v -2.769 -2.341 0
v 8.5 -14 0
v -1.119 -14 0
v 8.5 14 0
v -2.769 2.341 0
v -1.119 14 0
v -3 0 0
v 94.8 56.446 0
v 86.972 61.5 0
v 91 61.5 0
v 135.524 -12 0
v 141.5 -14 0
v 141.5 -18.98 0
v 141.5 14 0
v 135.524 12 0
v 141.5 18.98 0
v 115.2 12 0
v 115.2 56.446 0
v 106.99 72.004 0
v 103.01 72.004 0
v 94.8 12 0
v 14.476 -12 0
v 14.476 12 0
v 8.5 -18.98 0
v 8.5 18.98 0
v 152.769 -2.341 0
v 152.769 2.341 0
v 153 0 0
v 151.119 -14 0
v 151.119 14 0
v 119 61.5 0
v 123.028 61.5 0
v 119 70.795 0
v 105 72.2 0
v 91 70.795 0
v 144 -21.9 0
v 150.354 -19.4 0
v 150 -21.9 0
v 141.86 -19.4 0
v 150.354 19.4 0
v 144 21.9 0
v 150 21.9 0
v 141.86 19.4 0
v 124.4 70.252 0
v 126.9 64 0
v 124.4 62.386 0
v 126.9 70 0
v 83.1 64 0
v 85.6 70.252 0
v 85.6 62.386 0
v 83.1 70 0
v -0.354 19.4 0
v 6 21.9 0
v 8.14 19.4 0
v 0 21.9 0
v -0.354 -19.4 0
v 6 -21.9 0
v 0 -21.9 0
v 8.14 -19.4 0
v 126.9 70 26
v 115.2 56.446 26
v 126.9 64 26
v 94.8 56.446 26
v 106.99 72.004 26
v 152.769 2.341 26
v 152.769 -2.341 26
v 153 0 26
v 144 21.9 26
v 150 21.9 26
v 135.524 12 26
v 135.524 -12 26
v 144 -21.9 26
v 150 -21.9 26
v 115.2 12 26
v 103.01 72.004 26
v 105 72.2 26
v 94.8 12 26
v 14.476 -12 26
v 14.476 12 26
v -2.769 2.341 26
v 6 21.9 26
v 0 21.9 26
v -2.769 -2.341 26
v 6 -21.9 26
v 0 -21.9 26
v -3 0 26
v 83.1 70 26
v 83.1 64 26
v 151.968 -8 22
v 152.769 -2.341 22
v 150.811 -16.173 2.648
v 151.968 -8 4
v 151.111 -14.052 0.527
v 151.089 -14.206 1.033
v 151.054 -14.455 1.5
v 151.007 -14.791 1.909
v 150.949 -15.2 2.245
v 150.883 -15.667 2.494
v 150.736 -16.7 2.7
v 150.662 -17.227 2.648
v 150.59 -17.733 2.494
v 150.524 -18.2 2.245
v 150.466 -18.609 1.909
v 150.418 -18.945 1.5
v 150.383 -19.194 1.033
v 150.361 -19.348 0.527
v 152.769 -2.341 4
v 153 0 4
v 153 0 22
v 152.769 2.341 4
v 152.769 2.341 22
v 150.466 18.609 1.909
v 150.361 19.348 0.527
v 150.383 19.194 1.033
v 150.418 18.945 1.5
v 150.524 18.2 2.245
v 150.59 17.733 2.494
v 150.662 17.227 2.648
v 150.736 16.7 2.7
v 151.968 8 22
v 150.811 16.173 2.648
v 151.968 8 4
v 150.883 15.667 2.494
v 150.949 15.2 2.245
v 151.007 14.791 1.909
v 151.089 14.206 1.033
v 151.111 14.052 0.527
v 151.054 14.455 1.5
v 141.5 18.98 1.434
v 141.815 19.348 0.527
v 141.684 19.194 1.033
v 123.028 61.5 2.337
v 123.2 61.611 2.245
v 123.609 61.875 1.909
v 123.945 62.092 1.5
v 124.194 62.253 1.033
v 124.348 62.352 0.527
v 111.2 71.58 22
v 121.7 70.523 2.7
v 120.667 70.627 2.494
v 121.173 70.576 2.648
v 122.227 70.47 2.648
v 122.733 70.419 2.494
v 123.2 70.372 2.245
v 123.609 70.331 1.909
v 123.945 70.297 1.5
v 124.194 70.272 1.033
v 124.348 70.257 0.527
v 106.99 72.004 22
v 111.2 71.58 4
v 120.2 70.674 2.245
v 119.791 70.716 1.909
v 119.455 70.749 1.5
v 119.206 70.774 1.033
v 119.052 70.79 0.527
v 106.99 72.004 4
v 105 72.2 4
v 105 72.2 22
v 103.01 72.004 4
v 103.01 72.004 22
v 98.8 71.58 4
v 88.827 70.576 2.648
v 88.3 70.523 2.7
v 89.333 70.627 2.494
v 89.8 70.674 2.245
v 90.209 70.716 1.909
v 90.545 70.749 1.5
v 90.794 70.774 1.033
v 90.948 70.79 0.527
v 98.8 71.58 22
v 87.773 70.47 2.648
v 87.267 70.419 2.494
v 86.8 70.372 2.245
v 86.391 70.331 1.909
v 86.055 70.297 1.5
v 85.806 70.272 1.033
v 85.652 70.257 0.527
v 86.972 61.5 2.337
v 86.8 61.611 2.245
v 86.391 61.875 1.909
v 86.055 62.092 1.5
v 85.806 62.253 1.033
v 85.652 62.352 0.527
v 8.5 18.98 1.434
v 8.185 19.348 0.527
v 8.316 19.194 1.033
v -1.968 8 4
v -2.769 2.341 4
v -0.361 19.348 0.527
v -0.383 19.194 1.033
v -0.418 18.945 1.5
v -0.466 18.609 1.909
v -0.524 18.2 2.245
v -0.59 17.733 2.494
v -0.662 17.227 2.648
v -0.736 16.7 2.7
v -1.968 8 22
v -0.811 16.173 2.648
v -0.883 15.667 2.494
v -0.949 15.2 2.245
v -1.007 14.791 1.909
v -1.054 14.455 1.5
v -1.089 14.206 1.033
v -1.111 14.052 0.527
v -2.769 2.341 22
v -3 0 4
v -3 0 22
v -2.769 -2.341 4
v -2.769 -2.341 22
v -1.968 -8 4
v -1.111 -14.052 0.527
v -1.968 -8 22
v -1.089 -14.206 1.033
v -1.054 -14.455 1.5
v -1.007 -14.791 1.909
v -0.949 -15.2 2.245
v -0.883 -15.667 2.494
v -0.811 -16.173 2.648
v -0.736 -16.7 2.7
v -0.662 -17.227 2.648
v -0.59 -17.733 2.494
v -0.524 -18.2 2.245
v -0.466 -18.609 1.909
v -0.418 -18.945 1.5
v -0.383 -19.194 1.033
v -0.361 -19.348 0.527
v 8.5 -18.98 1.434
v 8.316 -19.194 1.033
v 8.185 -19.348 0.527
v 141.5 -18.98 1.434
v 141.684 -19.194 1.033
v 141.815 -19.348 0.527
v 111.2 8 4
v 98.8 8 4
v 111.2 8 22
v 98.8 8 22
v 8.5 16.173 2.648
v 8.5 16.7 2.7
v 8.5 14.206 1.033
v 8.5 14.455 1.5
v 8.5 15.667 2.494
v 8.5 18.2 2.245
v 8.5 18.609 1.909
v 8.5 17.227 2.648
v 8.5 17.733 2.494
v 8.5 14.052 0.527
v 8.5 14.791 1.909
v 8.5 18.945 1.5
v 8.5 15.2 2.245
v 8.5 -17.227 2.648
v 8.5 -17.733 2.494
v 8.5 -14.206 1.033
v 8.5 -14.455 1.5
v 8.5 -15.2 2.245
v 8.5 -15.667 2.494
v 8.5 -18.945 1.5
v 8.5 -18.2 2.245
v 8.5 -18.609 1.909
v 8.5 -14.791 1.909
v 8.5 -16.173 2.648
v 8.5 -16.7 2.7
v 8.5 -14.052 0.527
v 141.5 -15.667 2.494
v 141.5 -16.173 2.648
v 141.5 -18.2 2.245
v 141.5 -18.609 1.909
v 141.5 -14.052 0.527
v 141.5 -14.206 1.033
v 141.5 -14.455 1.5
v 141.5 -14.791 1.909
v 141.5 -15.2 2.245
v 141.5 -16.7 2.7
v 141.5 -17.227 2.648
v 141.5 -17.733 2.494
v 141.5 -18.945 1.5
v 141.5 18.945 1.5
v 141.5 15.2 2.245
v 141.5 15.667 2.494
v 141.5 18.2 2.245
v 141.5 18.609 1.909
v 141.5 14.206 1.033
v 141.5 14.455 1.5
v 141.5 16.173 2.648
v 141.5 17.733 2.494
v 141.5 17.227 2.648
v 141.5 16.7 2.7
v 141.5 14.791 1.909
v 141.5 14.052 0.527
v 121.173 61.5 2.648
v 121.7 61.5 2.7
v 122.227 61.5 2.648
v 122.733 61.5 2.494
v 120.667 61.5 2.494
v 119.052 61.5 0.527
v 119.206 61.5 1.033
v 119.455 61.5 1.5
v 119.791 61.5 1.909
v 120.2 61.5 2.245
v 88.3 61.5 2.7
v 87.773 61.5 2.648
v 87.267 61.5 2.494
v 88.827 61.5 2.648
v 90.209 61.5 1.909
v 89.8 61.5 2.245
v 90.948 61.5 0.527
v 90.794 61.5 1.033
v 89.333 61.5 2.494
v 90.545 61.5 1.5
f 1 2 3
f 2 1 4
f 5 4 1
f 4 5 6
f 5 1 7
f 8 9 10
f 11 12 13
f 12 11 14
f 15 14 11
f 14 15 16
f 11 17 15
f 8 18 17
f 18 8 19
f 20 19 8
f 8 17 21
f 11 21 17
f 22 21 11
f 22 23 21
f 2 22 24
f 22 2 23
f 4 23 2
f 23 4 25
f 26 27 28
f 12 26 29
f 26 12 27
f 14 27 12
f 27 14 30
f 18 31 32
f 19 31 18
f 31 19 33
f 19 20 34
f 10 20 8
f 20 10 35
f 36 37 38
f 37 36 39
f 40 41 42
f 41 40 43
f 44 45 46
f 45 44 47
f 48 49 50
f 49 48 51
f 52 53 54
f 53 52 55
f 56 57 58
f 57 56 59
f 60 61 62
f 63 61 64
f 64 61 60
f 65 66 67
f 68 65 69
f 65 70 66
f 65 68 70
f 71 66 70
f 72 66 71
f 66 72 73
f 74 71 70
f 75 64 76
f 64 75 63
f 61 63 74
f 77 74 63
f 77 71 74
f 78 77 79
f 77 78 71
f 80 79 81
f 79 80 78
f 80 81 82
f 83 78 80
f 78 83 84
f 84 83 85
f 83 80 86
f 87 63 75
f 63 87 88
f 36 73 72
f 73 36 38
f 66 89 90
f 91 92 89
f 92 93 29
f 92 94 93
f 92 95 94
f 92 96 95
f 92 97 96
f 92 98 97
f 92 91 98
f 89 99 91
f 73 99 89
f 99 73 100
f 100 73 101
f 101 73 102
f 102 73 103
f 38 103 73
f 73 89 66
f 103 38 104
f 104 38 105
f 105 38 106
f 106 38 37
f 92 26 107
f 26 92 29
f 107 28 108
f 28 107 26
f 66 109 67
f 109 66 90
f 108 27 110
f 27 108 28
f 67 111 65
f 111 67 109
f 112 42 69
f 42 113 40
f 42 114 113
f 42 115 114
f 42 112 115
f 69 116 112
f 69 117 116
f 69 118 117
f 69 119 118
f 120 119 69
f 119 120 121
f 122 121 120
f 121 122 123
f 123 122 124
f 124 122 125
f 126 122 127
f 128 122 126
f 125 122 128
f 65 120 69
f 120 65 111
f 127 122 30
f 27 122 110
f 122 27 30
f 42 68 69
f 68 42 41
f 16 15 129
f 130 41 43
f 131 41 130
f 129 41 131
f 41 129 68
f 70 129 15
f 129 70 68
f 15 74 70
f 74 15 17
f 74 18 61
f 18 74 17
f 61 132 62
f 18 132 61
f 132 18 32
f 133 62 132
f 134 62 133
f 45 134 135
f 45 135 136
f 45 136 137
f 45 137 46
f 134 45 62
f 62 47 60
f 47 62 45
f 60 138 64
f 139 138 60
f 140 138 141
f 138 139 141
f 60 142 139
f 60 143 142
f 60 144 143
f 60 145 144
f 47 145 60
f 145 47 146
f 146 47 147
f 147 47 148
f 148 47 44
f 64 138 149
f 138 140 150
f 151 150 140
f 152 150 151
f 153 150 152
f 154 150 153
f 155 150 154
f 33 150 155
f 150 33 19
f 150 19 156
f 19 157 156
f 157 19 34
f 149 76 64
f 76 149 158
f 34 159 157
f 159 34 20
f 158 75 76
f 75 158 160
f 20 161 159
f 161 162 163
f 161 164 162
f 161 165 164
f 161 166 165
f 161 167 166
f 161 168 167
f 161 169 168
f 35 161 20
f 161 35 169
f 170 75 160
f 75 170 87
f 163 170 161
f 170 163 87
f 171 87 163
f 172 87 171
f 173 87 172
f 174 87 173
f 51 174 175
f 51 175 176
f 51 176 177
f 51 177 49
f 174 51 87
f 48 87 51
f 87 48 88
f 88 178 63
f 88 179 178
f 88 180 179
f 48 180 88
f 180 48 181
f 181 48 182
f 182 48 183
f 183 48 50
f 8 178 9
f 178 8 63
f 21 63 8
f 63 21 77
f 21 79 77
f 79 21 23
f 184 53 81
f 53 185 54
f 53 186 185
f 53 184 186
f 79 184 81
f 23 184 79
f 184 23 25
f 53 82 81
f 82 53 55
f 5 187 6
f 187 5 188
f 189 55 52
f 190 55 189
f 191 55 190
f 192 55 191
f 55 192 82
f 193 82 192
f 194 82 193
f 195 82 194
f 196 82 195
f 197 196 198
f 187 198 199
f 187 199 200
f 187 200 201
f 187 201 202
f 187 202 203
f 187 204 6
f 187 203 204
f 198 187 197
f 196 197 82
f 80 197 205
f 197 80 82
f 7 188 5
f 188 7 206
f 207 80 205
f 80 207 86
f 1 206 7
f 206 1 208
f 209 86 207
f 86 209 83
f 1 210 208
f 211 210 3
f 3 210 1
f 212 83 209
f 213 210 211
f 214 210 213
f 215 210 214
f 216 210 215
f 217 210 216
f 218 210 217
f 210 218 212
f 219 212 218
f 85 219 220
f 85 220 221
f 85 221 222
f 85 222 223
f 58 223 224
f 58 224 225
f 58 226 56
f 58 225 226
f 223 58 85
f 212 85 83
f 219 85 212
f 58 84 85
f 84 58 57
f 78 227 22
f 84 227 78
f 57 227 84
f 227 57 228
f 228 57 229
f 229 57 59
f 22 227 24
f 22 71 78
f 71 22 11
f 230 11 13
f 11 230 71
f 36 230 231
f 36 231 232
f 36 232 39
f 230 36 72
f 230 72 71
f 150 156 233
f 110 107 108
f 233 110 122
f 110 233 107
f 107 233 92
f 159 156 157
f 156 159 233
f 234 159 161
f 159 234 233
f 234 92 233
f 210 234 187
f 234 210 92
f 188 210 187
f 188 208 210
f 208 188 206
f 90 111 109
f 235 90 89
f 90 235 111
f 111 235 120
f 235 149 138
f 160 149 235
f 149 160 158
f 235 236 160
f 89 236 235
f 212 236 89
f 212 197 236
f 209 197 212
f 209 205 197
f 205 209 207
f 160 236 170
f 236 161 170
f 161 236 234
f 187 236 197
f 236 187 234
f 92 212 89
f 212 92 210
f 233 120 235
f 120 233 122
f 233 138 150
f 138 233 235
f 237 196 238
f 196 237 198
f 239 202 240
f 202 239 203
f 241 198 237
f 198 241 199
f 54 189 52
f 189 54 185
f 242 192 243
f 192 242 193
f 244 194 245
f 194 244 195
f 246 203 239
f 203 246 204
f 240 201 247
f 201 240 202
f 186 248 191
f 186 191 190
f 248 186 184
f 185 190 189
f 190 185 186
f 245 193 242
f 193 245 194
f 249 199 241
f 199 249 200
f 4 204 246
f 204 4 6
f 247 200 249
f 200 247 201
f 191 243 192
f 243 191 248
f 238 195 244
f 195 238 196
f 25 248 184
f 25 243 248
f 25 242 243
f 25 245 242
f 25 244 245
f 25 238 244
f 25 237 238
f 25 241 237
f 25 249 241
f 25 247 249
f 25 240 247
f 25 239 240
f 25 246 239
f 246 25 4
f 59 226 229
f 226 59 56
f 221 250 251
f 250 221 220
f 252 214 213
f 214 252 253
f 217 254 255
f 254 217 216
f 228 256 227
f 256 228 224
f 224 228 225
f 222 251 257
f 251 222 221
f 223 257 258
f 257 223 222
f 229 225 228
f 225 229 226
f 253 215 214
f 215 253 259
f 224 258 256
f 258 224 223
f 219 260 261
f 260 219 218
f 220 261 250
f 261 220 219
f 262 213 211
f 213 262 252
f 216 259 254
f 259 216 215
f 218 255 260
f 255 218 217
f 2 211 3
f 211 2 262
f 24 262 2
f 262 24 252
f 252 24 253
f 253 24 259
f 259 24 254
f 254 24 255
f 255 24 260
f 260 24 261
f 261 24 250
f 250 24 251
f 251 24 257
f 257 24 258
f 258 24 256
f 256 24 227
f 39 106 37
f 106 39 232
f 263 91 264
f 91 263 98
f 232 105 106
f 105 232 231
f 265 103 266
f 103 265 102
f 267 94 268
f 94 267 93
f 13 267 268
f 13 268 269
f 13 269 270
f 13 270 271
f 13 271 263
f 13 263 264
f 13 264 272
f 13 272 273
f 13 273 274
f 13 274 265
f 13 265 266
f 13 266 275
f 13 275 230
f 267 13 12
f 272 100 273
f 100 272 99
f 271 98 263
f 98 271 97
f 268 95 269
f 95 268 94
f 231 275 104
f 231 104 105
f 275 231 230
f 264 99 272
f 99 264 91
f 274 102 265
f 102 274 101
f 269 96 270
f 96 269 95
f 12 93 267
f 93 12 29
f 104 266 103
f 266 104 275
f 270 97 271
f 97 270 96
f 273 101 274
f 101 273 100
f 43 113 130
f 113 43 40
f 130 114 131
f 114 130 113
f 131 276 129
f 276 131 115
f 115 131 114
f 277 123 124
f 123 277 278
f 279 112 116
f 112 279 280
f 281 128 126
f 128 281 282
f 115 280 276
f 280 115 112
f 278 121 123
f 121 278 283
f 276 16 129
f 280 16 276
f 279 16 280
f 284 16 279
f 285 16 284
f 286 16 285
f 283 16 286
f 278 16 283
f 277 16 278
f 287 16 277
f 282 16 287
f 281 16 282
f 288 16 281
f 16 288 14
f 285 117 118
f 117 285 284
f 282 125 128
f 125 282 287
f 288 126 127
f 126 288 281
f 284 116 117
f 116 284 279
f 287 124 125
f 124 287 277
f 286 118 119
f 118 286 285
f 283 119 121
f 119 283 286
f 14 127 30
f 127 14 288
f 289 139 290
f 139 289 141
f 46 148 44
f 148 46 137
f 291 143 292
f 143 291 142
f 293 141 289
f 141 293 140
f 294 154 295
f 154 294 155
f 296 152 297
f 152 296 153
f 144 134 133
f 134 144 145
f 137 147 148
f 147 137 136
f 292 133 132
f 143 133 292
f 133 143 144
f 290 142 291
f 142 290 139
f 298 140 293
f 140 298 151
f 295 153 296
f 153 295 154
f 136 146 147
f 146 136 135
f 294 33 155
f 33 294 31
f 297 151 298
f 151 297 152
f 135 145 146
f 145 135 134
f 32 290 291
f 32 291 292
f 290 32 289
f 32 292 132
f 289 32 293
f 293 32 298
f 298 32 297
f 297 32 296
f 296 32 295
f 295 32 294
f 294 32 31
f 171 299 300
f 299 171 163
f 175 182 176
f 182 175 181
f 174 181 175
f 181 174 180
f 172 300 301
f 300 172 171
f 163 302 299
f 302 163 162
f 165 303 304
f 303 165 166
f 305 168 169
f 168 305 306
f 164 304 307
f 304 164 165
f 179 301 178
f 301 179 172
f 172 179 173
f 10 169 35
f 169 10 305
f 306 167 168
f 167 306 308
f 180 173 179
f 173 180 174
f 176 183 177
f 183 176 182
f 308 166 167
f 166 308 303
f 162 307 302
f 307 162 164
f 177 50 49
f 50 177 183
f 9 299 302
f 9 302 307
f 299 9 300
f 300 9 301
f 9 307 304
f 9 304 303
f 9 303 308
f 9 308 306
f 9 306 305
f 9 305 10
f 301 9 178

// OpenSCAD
$fn = 32;

// ----------------------------------------------------------------------
// Air duct: 24 mm duct, 4 mm wall, 26 mm across
// ----------------------------------------------------------------------

// --- parameters (mm) ---
duct_r = 12;              // duct core radius
duct_d = 24;              // duct core diameter
wall = 4;                 // duct wall thickness
height = 26;              // duct width (extrusion height)
port_r = 21.9;            // port flange half width
port_d = 43.8;            // port flange width
port_t = 6;               // port flange thickness
bolt_d = 5.4;             // port bolt holes
bolt_offset = 16.7;       // bolt hole offset from the port axis
branch_r = 10.2;          // branch core radius
branch_d = 20.4;          // branch core diameter
branch_len = 70;          // branch length from the run axis

difference() {
  /* outer hull chain: tube with a flat flange plate at every port */
  linear_extrude(height = 26) {
    hull() {
      polygon([[0, -21.9], [0, 21.9], [6, 21.9], [6, -21.9]]);
      translate([9, 0]) circle(r = 12);
    }
    hull() {
      translate([9, 0]) circle(r = 12);
      translate([45, 0]) circle(r = 12);
    }
    hull() {
      translate([45, 0]) circle(r = 12);
      translate([105, 0]) circle(r = 12);
    }
    hull() {
      translate([105, 0]) circle(r = 12);
      translate([141, 0]) circle(r = 12);
    }
    hull() {
      translate([141, 0]) circle(r = 12);
      polygon([[150, 21.9], [150, -21.9], [144, -21.9], [144, 21.9]]);
    }
    hull() {
      translate([105, 0]) circle(r = 10.2);
      translate([105, 38.5]) circle(r = 10.2);
    }
    hull() {
      translate([105, 38.5]) circle(r = 10.2);
      translate([105, 62]) circle(r = 10.2);
    }
    hull() {
      translate([105, 62]) circle(r = 10.2);
      polygon([[83.1, 70], [126.9, 70], [126.9, 64], [83.1, 64]]);
    }
  }
  /* air passage: the same chain inset by the wall, 5 mm proud of the ports */
  translate([0, 0, 4]) linear_extrude(height = 18) {
    hull() {
      translate([-5, 0]) circle(r = 8);
      translate([45, 0]) circle(r = 8);
    }
    hull() {
      translate([45, 0]) circle(r = 8);
      translate([105, 0]) circle(r = 8);
    }
    hull() {
      translate([105, 0]) circle(r = 8);
      translate([155, 0]) circle(r = 8);
    }
    hull() {
      translate([105, 0]) circle(r = 6.2);
      translate([105, 38.5]) circle(r = 6.2);
    }
    hull() {
      translate([105, 38.5]) circle(r = 6.2);
      translate([105, 75]) circle(r = 6.2);
    }
  }
  translate([0, 0]) rotate([0, 0, -90]) translate([-16.7, -2.5]) rotate([-90, 0, 0]) cylinder(h = 11, d = 5.4);
  translate([0, 0]) rotate([0, 0, -90]) translate([16.7, -2.5]) rotate([-90, 0, 0]) cylinder(h = 11, d = 5.4);
  translate([150, 0]) rotate([0, 0, 90]) translate([-16.7, -2.5]) rotate([-90, 0, 0]) cylinder(h = 11, d = 5.4);
  translate([150, 0]) rotate([0, 0, 90]) translate([16.7, -2.5]) rotate([-90, 0, 0]) cylinder(h = 11, d = 5.4);
  translate([105, 70]) rotate([0, 0, 180]) translate([-16.7, -2.5]) rotate([-90, 0, 0]) cylinder(h = 11, d = 5.4);
  translate([105, 70]) rotate([0, 0, 180]) translate([16.7, -2.5]) rotate([-90, 0, 0]) cylinder(h = 11, d = 5.4);
}
